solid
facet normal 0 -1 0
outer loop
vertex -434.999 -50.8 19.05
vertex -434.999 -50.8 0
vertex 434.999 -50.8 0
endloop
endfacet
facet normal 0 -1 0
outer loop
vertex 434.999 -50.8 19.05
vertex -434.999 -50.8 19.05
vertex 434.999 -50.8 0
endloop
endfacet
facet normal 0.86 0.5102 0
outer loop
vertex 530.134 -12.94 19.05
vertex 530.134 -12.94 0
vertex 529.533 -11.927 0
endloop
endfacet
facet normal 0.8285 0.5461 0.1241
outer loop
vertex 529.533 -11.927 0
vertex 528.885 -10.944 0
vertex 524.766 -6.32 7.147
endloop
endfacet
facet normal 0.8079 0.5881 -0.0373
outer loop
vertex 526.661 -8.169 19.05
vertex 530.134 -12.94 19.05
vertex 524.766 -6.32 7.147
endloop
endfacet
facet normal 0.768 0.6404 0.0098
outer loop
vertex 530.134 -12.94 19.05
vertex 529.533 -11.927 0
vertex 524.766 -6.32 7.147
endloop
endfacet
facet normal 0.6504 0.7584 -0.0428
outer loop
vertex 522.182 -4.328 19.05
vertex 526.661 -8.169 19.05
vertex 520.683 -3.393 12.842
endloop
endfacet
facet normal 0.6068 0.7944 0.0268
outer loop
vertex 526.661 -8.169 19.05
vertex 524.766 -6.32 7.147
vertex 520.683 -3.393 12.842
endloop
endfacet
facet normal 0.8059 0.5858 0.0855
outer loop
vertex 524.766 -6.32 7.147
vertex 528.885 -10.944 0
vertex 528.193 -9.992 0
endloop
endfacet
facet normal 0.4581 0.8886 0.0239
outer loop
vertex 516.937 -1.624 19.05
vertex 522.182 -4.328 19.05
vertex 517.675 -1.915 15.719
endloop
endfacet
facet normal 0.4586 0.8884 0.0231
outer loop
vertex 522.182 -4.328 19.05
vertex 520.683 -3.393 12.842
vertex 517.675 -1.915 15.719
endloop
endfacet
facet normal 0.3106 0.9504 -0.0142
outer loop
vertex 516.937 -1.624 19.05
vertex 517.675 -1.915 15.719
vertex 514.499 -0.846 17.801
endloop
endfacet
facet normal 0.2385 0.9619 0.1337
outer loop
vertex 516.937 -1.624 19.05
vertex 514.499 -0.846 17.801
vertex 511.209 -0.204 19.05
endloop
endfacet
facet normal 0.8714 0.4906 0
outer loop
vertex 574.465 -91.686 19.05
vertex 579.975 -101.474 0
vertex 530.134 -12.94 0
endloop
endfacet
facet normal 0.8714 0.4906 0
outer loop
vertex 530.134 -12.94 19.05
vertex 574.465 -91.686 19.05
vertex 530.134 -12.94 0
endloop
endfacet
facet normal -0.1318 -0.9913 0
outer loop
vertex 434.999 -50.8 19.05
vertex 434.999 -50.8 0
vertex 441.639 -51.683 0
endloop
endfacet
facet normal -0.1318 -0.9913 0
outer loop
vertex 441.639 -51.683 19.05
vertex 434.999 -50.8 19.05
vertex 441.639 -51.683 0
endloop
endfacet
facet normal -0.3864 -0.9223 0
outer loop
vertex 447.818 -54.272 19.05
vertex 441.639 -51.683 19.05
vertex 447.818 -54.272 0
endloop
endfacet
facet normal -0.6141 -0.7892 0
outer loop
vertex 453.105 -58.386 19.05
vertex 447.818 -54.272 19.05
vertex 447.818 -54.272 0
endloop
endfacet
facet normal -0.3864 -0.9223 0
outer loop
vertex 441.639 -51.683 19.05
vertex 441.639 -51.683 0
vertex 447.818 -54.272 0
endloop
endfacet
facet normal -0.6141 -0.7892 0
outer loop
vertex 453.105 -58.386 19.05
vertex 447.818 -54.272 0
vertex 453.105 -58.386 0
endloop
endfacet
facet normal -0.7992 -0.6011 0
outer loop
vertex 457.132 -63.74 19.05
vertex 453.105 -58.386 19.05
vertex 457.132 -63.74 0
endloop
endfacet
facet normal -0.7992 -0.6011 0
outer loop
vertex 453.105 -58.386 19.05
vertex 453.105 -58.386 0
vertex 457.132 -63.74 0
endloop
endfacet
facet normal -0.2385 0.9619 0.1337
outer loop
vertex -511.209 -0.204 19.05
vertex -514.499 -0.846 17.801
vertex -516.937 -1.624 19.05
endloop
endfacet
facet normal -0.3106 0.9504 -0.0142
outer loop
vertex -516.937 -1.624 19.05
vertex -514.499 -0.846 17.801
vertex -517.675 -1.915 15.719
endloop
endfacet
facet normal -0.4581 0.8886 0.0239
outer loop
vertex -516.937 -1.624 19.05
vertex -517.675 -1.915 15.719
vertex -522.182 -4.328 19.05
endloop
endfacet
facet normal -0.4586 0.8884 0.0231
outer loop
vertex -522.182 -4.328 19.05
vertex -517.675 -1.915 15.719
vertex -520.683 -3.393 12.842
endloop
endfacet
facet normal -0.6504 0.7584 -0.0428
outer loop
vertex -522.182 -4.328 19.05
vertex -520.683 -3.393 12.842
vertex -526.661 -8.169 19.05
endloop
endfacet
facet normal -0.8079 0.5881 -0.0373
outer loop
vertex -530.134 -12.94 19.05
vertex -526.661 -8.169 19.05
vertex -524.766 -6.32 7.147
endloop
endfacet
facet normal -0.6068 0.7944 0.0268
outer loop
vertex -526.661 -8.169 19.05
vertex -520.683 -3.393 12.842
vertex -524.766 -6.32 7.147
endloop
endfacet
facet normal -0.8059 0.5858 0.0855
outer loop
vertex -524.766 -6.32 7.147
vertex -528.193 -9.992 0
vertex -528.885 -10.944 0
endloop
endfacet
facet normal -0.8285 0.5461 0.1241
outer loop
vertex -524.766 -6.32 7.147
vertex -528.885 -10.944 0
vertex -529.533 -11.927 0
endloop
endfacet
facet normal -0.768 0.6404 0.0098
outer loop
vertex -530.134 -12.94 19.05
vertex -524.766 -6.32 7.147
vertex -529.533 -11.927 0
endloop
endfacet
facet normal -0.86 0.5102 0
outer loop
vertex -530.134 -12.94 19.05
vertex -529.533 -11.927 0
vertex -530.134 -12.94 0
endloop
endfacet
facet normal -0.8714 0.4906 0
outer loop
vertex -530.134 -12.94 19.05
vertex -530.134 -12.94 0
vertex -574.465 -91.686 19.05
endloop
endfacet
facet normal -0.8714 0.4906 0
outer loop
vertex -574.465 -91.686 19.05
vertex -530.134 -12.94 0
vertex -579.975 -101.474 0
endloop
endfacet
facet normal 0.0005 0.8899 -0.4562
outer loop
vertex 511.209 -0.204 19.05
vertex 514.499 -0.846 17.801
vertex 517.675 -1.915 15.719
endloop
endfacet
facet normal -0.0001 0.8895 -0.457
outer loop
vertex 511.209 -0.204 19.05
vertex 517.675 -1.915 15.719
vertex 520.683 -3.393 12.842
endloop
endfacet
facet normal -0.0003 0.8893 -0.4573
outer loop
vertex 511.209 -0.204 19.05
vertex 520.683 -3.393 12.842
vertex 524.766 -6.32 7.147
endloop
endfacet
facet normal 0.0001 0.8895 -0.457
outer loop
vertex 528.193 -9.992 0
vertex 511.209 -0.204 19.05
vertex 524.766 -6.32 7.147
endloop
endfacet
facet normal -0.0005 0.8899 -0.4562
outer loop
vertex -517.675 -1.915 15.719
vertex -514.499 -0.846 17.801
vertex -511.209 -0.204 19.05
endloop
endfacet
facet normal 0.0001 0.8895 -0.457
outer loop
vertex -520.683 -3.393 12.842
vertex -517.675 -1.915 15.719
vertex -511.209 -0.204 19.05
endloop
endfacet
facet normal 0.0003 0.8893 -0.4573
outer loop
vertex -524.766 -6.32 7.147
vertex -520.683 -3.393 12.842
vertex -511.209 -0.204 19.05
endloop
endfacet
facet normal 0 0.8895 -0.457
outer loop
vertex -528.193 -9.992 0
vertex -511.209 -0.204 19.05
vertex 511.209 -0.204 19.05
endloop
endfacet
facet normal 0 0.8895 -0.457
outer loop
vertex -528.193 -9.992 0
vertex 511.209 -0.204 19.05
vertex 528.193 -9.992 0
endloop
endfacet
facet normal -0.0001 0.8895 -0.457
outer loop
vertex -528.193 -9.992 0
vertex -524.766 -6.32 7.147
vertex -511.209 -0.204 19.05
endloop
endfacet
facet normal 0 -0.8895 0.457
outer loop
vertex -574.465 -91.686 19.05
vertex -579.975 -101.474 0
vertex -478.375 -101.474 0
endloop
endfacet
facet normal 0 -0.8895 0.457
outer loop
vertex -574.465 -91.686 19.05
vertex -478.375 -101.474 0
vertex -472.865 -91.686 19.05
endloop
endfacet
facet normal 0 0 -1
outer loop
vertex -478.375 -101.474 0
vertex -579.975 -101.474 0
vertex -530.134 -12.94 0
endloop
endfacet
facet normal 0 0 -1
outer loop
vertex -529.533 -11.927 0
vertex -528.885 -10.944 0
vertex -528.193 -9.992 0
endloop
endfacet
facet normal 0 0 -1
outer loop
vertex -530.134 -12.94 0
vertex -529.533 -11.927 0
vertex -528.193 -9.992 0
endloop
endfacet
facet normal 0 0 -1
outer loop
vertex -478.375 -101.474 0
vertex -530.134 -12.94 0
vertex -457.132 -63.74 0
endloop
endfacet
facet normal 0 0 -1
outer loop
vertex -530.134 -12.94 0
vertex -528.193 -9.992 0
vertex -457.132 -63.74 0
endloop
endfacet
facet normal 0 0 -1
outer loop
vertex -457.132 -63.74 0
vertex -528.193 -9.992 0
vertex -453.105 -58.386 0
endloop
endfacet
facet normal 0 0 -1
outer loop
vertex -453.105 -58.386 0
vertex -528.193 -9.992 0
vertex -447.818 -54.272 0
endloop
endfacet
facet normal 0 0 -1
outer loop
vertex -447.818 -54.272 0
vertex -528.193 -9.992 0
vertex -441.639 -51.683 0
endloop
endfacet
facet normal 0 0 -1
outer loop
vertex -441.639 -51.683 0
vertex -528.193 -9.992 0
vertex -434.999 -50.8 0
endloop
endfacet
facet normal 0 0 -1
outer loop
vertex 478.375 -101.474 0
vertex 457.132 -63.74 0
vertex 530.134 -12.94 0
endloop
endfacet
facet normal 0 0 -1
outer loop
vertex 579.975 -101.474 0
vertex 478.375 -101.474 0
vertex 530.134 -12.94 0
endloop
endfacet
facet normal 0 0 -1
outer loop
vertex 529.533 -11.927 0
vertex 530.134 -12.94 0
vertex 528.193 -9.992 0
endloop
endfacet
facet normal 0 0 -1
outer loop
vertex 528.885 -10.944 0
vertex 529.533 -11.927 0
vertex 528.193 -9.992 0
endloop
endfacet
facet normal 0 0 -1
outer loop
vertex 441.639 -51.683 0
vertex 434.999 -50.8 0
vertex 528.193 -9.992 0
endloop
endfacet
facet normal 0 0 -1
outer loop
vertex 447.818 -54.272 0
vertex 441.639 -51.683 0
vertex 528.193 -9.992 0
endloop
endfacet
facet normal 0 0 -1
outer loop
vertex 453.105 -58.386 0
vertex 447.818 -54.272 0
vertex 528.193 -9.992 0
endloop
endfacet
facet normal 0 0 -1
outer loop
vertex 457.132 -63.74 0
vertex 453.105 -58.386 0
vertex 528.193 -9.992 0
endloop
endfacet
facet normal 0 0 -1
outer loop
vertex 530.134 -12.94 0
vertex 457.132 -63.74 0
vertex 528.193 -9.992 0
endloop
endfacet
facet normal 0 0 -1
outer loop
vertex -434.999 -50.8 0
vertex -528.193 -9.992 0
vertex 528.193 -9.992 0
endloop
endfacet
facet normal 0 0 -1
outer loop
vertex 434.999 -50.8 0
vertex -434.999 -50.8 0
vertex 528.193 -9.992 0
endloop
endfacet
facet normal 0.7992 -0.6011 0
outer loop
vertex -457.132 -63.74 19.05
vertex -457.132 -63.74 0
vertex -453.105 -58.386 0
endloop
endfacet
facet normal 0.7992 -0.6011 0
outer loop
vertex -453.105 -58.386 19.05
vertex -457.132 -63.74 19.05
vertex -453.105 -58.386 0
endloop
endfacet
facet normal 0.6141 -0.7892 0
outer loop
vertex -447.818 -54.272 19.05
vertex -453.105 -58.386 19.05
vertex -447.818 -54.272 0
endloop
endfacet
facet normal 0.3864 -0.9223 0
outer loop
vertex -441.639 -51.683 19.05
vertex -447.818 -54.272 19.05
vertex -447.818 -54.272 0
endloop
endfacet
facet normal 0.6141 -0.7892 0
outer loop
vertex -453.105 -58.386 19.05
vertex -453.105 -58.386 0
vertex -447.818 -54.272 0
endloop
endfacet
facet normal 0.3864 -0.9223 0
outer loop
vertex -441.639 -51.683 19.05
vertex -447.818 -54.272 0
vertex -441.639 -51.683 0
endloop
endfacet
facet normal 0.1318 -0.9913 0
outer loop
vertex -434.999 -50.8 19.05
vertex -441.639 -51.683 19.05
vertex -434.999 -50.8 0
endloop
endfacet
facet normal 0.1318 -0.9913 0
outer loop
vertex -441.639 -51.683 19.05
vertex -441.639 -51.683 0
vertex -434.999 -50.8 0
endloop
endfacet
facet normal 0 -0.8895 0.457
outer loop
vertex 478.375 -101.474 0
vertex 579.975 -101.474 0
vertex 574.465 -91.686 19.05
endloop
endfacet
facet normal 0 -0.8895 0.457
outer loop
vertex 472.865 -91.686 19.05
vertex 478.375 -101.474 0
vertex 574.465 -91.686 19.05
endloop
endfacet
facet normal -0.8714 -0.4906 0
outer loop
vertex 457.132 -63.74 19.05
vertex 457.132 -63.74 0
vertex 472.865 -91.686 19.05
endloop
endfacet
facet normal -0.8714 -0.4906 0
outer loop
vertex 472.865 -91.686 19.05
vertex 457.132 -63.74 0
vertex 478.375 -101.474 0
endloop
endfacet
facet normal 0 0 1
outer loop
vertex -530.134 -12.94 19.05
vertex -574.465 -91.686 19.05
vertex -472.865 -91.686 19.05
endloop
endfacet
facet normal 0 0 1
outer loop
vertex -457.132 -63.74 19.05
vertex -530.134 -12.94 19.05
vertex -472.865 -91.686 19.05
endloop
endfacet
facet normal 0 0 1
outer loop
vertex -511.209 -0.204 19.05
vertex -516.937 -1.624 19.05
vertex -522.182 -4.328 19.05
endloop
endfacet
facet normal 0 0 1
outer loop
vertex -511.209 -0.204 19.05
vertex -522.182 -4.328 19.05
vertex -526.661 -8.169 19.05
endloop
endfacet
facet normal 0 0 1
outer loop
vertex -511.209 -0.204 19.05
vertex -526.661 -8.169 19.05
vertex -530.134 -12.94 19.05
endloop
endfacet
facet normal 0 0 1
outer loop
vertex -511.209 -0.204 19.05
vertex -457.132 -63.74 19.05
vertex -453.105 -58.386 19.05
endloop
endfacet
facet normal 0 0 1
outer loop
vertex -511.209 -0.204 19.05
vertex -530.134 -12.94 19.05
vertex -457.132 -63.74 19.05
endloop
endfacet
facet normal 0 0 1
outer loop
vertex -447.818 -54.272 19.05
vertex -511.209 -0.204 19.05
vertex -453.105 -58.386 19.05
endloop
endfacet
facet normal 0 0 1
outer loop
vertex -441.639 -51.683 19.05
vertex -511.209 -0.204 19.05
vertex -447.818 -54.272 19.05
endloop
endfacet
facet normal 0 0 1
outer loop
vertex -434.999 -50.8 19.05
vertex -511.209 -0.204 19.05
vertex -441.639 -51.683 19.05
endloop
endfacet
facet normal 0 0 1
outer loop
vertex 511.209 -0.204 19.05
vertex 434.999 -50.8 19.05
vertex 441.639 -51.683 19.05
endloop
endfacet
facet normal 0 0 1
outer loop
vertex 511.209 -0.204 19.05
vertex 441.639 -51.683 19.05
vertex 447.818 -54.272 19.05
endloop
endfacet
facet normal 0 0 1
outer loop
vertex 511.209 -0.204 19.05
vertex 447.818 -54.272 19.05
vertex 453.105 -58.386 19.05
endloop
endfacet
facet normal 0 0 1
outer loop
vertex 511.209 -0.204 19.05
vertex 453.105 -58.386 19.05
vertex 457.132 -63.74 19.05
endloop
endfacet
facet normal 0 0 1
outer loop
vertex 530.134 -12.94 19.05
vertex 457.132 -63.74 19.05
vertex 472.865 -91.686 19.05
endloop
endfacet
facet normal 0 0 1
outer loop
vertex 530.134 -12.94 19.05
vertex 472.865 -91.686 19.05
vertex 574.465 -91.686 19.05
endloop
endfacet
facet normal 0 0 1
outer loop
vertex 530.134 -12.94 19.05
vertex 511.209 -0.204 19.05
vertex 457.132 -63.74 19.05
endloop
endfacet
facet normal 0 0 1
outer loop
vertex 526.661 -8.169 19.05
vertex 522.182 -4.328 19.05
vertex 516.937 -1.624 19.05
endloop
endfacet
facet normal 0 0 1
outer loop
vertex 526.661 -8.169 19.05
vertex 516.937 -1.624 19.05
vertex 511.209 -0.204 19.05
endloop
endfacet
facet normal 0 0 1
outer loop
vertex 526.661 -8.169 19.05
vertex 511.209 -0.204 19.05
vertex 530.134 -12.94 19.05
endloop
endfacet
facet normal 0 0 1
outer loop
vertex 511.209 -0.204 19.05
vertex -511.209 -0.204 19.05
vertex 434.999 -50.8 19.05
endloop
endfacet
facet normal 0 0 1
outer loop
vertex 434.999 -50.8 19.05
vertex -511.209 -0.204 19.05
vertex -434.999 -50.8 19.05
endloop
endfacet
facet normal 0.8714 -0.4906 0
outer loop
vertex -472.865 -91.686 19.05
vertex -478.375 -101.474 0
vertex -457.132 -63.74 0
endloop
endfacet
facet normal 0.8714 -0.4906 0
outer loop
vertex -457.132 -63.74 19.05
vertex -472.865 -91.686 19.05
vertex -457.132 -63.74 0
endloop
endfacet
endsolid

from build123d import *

# Parameters (mm, degrees)
BOSS_EXTRUDE1_DEPTH     = 19.05
SKETCH2_W               = 197.138384739
SKETCH2_H               = 233.965884384
CUT_EXTRUDE1_DEPTH      = 580.97531403
CUT_EXTRUDE1_DEPTH_BACK = 580.97531403


with BuildPart() as part:
    # Sketch1 → Boss-Extrude1 (new body)
    with BuildSketch(Plane.XY):
        with BuildLine():
            Line((508, 0), (-508, 0))
            ThreePointArc((-508, 0), (-520.8192309, -3.472224939), (-530.133638711, -12.93958117))
            Line((-530.133638711, -12.93958117), (-579.97531403, -101.474136014))
            Line((-579.97531403, -101.474136014), (-478.37531403, -101.474136014))
            Line((-478.37531403, -101.474136014), (-457.132157229, -63.73958117))
            ThreePointArc((-457.132157229, -63.73958117), (-447.817749418, -54.272224939), (-434.998518519, -50.8))
            Line((-434.998518519, -50.8), (434.998518519, -50.8))
            ThreePointArc((434.998518519, -50.8), (447.817749418, -54.272224939), (457.132157229, -63.73958117))
            Line((457.132157229, -63.73958117), (478.37531403, -101.474136014))
            Line((478.37531403, -101.474136014), (579.97531403, -101.474136014))
            Line((579.97531403, -101.474136014), (530.133638711, -12.93958117))
            ThreePointArc((530.133638711, -12.93958117), (520.8192309, -3.472224939), (508, 0))
        make_face()
    extrude(amount=BOSS_EXTRUDE1_DEPTH)

    # Sketch2 → Cut-Extrude1 (cut, two sides)
    with BuildSketch(Plane(origin=(0, 0, 0), x_dir=(0, 0, -1), z_dir=(1, 0, 0))) as cut_extrude1_sk:
        with Locations((-13.729414766, -53.345438188)):
            Rectangle(SKETCH2_W, SKETCH2_H)
        Polygon((0, -101.474136014), (-60.85250598, -70.206121999), (-23.664545619, 2.167536884), (37.187960361, -29.100477131), align=None, mode=Mode.SUBTRACT)
    extrude(amount=CUT_EXTRUDE1_DEPTH, mode=Mode.SUBTRACT)
    extrude(cut_extrude1_sk.sketch, amount=-CUT_EXTRUDE1_DEPTH_BACK, mode=Mode.SUBTRACT)


solid = part.part
